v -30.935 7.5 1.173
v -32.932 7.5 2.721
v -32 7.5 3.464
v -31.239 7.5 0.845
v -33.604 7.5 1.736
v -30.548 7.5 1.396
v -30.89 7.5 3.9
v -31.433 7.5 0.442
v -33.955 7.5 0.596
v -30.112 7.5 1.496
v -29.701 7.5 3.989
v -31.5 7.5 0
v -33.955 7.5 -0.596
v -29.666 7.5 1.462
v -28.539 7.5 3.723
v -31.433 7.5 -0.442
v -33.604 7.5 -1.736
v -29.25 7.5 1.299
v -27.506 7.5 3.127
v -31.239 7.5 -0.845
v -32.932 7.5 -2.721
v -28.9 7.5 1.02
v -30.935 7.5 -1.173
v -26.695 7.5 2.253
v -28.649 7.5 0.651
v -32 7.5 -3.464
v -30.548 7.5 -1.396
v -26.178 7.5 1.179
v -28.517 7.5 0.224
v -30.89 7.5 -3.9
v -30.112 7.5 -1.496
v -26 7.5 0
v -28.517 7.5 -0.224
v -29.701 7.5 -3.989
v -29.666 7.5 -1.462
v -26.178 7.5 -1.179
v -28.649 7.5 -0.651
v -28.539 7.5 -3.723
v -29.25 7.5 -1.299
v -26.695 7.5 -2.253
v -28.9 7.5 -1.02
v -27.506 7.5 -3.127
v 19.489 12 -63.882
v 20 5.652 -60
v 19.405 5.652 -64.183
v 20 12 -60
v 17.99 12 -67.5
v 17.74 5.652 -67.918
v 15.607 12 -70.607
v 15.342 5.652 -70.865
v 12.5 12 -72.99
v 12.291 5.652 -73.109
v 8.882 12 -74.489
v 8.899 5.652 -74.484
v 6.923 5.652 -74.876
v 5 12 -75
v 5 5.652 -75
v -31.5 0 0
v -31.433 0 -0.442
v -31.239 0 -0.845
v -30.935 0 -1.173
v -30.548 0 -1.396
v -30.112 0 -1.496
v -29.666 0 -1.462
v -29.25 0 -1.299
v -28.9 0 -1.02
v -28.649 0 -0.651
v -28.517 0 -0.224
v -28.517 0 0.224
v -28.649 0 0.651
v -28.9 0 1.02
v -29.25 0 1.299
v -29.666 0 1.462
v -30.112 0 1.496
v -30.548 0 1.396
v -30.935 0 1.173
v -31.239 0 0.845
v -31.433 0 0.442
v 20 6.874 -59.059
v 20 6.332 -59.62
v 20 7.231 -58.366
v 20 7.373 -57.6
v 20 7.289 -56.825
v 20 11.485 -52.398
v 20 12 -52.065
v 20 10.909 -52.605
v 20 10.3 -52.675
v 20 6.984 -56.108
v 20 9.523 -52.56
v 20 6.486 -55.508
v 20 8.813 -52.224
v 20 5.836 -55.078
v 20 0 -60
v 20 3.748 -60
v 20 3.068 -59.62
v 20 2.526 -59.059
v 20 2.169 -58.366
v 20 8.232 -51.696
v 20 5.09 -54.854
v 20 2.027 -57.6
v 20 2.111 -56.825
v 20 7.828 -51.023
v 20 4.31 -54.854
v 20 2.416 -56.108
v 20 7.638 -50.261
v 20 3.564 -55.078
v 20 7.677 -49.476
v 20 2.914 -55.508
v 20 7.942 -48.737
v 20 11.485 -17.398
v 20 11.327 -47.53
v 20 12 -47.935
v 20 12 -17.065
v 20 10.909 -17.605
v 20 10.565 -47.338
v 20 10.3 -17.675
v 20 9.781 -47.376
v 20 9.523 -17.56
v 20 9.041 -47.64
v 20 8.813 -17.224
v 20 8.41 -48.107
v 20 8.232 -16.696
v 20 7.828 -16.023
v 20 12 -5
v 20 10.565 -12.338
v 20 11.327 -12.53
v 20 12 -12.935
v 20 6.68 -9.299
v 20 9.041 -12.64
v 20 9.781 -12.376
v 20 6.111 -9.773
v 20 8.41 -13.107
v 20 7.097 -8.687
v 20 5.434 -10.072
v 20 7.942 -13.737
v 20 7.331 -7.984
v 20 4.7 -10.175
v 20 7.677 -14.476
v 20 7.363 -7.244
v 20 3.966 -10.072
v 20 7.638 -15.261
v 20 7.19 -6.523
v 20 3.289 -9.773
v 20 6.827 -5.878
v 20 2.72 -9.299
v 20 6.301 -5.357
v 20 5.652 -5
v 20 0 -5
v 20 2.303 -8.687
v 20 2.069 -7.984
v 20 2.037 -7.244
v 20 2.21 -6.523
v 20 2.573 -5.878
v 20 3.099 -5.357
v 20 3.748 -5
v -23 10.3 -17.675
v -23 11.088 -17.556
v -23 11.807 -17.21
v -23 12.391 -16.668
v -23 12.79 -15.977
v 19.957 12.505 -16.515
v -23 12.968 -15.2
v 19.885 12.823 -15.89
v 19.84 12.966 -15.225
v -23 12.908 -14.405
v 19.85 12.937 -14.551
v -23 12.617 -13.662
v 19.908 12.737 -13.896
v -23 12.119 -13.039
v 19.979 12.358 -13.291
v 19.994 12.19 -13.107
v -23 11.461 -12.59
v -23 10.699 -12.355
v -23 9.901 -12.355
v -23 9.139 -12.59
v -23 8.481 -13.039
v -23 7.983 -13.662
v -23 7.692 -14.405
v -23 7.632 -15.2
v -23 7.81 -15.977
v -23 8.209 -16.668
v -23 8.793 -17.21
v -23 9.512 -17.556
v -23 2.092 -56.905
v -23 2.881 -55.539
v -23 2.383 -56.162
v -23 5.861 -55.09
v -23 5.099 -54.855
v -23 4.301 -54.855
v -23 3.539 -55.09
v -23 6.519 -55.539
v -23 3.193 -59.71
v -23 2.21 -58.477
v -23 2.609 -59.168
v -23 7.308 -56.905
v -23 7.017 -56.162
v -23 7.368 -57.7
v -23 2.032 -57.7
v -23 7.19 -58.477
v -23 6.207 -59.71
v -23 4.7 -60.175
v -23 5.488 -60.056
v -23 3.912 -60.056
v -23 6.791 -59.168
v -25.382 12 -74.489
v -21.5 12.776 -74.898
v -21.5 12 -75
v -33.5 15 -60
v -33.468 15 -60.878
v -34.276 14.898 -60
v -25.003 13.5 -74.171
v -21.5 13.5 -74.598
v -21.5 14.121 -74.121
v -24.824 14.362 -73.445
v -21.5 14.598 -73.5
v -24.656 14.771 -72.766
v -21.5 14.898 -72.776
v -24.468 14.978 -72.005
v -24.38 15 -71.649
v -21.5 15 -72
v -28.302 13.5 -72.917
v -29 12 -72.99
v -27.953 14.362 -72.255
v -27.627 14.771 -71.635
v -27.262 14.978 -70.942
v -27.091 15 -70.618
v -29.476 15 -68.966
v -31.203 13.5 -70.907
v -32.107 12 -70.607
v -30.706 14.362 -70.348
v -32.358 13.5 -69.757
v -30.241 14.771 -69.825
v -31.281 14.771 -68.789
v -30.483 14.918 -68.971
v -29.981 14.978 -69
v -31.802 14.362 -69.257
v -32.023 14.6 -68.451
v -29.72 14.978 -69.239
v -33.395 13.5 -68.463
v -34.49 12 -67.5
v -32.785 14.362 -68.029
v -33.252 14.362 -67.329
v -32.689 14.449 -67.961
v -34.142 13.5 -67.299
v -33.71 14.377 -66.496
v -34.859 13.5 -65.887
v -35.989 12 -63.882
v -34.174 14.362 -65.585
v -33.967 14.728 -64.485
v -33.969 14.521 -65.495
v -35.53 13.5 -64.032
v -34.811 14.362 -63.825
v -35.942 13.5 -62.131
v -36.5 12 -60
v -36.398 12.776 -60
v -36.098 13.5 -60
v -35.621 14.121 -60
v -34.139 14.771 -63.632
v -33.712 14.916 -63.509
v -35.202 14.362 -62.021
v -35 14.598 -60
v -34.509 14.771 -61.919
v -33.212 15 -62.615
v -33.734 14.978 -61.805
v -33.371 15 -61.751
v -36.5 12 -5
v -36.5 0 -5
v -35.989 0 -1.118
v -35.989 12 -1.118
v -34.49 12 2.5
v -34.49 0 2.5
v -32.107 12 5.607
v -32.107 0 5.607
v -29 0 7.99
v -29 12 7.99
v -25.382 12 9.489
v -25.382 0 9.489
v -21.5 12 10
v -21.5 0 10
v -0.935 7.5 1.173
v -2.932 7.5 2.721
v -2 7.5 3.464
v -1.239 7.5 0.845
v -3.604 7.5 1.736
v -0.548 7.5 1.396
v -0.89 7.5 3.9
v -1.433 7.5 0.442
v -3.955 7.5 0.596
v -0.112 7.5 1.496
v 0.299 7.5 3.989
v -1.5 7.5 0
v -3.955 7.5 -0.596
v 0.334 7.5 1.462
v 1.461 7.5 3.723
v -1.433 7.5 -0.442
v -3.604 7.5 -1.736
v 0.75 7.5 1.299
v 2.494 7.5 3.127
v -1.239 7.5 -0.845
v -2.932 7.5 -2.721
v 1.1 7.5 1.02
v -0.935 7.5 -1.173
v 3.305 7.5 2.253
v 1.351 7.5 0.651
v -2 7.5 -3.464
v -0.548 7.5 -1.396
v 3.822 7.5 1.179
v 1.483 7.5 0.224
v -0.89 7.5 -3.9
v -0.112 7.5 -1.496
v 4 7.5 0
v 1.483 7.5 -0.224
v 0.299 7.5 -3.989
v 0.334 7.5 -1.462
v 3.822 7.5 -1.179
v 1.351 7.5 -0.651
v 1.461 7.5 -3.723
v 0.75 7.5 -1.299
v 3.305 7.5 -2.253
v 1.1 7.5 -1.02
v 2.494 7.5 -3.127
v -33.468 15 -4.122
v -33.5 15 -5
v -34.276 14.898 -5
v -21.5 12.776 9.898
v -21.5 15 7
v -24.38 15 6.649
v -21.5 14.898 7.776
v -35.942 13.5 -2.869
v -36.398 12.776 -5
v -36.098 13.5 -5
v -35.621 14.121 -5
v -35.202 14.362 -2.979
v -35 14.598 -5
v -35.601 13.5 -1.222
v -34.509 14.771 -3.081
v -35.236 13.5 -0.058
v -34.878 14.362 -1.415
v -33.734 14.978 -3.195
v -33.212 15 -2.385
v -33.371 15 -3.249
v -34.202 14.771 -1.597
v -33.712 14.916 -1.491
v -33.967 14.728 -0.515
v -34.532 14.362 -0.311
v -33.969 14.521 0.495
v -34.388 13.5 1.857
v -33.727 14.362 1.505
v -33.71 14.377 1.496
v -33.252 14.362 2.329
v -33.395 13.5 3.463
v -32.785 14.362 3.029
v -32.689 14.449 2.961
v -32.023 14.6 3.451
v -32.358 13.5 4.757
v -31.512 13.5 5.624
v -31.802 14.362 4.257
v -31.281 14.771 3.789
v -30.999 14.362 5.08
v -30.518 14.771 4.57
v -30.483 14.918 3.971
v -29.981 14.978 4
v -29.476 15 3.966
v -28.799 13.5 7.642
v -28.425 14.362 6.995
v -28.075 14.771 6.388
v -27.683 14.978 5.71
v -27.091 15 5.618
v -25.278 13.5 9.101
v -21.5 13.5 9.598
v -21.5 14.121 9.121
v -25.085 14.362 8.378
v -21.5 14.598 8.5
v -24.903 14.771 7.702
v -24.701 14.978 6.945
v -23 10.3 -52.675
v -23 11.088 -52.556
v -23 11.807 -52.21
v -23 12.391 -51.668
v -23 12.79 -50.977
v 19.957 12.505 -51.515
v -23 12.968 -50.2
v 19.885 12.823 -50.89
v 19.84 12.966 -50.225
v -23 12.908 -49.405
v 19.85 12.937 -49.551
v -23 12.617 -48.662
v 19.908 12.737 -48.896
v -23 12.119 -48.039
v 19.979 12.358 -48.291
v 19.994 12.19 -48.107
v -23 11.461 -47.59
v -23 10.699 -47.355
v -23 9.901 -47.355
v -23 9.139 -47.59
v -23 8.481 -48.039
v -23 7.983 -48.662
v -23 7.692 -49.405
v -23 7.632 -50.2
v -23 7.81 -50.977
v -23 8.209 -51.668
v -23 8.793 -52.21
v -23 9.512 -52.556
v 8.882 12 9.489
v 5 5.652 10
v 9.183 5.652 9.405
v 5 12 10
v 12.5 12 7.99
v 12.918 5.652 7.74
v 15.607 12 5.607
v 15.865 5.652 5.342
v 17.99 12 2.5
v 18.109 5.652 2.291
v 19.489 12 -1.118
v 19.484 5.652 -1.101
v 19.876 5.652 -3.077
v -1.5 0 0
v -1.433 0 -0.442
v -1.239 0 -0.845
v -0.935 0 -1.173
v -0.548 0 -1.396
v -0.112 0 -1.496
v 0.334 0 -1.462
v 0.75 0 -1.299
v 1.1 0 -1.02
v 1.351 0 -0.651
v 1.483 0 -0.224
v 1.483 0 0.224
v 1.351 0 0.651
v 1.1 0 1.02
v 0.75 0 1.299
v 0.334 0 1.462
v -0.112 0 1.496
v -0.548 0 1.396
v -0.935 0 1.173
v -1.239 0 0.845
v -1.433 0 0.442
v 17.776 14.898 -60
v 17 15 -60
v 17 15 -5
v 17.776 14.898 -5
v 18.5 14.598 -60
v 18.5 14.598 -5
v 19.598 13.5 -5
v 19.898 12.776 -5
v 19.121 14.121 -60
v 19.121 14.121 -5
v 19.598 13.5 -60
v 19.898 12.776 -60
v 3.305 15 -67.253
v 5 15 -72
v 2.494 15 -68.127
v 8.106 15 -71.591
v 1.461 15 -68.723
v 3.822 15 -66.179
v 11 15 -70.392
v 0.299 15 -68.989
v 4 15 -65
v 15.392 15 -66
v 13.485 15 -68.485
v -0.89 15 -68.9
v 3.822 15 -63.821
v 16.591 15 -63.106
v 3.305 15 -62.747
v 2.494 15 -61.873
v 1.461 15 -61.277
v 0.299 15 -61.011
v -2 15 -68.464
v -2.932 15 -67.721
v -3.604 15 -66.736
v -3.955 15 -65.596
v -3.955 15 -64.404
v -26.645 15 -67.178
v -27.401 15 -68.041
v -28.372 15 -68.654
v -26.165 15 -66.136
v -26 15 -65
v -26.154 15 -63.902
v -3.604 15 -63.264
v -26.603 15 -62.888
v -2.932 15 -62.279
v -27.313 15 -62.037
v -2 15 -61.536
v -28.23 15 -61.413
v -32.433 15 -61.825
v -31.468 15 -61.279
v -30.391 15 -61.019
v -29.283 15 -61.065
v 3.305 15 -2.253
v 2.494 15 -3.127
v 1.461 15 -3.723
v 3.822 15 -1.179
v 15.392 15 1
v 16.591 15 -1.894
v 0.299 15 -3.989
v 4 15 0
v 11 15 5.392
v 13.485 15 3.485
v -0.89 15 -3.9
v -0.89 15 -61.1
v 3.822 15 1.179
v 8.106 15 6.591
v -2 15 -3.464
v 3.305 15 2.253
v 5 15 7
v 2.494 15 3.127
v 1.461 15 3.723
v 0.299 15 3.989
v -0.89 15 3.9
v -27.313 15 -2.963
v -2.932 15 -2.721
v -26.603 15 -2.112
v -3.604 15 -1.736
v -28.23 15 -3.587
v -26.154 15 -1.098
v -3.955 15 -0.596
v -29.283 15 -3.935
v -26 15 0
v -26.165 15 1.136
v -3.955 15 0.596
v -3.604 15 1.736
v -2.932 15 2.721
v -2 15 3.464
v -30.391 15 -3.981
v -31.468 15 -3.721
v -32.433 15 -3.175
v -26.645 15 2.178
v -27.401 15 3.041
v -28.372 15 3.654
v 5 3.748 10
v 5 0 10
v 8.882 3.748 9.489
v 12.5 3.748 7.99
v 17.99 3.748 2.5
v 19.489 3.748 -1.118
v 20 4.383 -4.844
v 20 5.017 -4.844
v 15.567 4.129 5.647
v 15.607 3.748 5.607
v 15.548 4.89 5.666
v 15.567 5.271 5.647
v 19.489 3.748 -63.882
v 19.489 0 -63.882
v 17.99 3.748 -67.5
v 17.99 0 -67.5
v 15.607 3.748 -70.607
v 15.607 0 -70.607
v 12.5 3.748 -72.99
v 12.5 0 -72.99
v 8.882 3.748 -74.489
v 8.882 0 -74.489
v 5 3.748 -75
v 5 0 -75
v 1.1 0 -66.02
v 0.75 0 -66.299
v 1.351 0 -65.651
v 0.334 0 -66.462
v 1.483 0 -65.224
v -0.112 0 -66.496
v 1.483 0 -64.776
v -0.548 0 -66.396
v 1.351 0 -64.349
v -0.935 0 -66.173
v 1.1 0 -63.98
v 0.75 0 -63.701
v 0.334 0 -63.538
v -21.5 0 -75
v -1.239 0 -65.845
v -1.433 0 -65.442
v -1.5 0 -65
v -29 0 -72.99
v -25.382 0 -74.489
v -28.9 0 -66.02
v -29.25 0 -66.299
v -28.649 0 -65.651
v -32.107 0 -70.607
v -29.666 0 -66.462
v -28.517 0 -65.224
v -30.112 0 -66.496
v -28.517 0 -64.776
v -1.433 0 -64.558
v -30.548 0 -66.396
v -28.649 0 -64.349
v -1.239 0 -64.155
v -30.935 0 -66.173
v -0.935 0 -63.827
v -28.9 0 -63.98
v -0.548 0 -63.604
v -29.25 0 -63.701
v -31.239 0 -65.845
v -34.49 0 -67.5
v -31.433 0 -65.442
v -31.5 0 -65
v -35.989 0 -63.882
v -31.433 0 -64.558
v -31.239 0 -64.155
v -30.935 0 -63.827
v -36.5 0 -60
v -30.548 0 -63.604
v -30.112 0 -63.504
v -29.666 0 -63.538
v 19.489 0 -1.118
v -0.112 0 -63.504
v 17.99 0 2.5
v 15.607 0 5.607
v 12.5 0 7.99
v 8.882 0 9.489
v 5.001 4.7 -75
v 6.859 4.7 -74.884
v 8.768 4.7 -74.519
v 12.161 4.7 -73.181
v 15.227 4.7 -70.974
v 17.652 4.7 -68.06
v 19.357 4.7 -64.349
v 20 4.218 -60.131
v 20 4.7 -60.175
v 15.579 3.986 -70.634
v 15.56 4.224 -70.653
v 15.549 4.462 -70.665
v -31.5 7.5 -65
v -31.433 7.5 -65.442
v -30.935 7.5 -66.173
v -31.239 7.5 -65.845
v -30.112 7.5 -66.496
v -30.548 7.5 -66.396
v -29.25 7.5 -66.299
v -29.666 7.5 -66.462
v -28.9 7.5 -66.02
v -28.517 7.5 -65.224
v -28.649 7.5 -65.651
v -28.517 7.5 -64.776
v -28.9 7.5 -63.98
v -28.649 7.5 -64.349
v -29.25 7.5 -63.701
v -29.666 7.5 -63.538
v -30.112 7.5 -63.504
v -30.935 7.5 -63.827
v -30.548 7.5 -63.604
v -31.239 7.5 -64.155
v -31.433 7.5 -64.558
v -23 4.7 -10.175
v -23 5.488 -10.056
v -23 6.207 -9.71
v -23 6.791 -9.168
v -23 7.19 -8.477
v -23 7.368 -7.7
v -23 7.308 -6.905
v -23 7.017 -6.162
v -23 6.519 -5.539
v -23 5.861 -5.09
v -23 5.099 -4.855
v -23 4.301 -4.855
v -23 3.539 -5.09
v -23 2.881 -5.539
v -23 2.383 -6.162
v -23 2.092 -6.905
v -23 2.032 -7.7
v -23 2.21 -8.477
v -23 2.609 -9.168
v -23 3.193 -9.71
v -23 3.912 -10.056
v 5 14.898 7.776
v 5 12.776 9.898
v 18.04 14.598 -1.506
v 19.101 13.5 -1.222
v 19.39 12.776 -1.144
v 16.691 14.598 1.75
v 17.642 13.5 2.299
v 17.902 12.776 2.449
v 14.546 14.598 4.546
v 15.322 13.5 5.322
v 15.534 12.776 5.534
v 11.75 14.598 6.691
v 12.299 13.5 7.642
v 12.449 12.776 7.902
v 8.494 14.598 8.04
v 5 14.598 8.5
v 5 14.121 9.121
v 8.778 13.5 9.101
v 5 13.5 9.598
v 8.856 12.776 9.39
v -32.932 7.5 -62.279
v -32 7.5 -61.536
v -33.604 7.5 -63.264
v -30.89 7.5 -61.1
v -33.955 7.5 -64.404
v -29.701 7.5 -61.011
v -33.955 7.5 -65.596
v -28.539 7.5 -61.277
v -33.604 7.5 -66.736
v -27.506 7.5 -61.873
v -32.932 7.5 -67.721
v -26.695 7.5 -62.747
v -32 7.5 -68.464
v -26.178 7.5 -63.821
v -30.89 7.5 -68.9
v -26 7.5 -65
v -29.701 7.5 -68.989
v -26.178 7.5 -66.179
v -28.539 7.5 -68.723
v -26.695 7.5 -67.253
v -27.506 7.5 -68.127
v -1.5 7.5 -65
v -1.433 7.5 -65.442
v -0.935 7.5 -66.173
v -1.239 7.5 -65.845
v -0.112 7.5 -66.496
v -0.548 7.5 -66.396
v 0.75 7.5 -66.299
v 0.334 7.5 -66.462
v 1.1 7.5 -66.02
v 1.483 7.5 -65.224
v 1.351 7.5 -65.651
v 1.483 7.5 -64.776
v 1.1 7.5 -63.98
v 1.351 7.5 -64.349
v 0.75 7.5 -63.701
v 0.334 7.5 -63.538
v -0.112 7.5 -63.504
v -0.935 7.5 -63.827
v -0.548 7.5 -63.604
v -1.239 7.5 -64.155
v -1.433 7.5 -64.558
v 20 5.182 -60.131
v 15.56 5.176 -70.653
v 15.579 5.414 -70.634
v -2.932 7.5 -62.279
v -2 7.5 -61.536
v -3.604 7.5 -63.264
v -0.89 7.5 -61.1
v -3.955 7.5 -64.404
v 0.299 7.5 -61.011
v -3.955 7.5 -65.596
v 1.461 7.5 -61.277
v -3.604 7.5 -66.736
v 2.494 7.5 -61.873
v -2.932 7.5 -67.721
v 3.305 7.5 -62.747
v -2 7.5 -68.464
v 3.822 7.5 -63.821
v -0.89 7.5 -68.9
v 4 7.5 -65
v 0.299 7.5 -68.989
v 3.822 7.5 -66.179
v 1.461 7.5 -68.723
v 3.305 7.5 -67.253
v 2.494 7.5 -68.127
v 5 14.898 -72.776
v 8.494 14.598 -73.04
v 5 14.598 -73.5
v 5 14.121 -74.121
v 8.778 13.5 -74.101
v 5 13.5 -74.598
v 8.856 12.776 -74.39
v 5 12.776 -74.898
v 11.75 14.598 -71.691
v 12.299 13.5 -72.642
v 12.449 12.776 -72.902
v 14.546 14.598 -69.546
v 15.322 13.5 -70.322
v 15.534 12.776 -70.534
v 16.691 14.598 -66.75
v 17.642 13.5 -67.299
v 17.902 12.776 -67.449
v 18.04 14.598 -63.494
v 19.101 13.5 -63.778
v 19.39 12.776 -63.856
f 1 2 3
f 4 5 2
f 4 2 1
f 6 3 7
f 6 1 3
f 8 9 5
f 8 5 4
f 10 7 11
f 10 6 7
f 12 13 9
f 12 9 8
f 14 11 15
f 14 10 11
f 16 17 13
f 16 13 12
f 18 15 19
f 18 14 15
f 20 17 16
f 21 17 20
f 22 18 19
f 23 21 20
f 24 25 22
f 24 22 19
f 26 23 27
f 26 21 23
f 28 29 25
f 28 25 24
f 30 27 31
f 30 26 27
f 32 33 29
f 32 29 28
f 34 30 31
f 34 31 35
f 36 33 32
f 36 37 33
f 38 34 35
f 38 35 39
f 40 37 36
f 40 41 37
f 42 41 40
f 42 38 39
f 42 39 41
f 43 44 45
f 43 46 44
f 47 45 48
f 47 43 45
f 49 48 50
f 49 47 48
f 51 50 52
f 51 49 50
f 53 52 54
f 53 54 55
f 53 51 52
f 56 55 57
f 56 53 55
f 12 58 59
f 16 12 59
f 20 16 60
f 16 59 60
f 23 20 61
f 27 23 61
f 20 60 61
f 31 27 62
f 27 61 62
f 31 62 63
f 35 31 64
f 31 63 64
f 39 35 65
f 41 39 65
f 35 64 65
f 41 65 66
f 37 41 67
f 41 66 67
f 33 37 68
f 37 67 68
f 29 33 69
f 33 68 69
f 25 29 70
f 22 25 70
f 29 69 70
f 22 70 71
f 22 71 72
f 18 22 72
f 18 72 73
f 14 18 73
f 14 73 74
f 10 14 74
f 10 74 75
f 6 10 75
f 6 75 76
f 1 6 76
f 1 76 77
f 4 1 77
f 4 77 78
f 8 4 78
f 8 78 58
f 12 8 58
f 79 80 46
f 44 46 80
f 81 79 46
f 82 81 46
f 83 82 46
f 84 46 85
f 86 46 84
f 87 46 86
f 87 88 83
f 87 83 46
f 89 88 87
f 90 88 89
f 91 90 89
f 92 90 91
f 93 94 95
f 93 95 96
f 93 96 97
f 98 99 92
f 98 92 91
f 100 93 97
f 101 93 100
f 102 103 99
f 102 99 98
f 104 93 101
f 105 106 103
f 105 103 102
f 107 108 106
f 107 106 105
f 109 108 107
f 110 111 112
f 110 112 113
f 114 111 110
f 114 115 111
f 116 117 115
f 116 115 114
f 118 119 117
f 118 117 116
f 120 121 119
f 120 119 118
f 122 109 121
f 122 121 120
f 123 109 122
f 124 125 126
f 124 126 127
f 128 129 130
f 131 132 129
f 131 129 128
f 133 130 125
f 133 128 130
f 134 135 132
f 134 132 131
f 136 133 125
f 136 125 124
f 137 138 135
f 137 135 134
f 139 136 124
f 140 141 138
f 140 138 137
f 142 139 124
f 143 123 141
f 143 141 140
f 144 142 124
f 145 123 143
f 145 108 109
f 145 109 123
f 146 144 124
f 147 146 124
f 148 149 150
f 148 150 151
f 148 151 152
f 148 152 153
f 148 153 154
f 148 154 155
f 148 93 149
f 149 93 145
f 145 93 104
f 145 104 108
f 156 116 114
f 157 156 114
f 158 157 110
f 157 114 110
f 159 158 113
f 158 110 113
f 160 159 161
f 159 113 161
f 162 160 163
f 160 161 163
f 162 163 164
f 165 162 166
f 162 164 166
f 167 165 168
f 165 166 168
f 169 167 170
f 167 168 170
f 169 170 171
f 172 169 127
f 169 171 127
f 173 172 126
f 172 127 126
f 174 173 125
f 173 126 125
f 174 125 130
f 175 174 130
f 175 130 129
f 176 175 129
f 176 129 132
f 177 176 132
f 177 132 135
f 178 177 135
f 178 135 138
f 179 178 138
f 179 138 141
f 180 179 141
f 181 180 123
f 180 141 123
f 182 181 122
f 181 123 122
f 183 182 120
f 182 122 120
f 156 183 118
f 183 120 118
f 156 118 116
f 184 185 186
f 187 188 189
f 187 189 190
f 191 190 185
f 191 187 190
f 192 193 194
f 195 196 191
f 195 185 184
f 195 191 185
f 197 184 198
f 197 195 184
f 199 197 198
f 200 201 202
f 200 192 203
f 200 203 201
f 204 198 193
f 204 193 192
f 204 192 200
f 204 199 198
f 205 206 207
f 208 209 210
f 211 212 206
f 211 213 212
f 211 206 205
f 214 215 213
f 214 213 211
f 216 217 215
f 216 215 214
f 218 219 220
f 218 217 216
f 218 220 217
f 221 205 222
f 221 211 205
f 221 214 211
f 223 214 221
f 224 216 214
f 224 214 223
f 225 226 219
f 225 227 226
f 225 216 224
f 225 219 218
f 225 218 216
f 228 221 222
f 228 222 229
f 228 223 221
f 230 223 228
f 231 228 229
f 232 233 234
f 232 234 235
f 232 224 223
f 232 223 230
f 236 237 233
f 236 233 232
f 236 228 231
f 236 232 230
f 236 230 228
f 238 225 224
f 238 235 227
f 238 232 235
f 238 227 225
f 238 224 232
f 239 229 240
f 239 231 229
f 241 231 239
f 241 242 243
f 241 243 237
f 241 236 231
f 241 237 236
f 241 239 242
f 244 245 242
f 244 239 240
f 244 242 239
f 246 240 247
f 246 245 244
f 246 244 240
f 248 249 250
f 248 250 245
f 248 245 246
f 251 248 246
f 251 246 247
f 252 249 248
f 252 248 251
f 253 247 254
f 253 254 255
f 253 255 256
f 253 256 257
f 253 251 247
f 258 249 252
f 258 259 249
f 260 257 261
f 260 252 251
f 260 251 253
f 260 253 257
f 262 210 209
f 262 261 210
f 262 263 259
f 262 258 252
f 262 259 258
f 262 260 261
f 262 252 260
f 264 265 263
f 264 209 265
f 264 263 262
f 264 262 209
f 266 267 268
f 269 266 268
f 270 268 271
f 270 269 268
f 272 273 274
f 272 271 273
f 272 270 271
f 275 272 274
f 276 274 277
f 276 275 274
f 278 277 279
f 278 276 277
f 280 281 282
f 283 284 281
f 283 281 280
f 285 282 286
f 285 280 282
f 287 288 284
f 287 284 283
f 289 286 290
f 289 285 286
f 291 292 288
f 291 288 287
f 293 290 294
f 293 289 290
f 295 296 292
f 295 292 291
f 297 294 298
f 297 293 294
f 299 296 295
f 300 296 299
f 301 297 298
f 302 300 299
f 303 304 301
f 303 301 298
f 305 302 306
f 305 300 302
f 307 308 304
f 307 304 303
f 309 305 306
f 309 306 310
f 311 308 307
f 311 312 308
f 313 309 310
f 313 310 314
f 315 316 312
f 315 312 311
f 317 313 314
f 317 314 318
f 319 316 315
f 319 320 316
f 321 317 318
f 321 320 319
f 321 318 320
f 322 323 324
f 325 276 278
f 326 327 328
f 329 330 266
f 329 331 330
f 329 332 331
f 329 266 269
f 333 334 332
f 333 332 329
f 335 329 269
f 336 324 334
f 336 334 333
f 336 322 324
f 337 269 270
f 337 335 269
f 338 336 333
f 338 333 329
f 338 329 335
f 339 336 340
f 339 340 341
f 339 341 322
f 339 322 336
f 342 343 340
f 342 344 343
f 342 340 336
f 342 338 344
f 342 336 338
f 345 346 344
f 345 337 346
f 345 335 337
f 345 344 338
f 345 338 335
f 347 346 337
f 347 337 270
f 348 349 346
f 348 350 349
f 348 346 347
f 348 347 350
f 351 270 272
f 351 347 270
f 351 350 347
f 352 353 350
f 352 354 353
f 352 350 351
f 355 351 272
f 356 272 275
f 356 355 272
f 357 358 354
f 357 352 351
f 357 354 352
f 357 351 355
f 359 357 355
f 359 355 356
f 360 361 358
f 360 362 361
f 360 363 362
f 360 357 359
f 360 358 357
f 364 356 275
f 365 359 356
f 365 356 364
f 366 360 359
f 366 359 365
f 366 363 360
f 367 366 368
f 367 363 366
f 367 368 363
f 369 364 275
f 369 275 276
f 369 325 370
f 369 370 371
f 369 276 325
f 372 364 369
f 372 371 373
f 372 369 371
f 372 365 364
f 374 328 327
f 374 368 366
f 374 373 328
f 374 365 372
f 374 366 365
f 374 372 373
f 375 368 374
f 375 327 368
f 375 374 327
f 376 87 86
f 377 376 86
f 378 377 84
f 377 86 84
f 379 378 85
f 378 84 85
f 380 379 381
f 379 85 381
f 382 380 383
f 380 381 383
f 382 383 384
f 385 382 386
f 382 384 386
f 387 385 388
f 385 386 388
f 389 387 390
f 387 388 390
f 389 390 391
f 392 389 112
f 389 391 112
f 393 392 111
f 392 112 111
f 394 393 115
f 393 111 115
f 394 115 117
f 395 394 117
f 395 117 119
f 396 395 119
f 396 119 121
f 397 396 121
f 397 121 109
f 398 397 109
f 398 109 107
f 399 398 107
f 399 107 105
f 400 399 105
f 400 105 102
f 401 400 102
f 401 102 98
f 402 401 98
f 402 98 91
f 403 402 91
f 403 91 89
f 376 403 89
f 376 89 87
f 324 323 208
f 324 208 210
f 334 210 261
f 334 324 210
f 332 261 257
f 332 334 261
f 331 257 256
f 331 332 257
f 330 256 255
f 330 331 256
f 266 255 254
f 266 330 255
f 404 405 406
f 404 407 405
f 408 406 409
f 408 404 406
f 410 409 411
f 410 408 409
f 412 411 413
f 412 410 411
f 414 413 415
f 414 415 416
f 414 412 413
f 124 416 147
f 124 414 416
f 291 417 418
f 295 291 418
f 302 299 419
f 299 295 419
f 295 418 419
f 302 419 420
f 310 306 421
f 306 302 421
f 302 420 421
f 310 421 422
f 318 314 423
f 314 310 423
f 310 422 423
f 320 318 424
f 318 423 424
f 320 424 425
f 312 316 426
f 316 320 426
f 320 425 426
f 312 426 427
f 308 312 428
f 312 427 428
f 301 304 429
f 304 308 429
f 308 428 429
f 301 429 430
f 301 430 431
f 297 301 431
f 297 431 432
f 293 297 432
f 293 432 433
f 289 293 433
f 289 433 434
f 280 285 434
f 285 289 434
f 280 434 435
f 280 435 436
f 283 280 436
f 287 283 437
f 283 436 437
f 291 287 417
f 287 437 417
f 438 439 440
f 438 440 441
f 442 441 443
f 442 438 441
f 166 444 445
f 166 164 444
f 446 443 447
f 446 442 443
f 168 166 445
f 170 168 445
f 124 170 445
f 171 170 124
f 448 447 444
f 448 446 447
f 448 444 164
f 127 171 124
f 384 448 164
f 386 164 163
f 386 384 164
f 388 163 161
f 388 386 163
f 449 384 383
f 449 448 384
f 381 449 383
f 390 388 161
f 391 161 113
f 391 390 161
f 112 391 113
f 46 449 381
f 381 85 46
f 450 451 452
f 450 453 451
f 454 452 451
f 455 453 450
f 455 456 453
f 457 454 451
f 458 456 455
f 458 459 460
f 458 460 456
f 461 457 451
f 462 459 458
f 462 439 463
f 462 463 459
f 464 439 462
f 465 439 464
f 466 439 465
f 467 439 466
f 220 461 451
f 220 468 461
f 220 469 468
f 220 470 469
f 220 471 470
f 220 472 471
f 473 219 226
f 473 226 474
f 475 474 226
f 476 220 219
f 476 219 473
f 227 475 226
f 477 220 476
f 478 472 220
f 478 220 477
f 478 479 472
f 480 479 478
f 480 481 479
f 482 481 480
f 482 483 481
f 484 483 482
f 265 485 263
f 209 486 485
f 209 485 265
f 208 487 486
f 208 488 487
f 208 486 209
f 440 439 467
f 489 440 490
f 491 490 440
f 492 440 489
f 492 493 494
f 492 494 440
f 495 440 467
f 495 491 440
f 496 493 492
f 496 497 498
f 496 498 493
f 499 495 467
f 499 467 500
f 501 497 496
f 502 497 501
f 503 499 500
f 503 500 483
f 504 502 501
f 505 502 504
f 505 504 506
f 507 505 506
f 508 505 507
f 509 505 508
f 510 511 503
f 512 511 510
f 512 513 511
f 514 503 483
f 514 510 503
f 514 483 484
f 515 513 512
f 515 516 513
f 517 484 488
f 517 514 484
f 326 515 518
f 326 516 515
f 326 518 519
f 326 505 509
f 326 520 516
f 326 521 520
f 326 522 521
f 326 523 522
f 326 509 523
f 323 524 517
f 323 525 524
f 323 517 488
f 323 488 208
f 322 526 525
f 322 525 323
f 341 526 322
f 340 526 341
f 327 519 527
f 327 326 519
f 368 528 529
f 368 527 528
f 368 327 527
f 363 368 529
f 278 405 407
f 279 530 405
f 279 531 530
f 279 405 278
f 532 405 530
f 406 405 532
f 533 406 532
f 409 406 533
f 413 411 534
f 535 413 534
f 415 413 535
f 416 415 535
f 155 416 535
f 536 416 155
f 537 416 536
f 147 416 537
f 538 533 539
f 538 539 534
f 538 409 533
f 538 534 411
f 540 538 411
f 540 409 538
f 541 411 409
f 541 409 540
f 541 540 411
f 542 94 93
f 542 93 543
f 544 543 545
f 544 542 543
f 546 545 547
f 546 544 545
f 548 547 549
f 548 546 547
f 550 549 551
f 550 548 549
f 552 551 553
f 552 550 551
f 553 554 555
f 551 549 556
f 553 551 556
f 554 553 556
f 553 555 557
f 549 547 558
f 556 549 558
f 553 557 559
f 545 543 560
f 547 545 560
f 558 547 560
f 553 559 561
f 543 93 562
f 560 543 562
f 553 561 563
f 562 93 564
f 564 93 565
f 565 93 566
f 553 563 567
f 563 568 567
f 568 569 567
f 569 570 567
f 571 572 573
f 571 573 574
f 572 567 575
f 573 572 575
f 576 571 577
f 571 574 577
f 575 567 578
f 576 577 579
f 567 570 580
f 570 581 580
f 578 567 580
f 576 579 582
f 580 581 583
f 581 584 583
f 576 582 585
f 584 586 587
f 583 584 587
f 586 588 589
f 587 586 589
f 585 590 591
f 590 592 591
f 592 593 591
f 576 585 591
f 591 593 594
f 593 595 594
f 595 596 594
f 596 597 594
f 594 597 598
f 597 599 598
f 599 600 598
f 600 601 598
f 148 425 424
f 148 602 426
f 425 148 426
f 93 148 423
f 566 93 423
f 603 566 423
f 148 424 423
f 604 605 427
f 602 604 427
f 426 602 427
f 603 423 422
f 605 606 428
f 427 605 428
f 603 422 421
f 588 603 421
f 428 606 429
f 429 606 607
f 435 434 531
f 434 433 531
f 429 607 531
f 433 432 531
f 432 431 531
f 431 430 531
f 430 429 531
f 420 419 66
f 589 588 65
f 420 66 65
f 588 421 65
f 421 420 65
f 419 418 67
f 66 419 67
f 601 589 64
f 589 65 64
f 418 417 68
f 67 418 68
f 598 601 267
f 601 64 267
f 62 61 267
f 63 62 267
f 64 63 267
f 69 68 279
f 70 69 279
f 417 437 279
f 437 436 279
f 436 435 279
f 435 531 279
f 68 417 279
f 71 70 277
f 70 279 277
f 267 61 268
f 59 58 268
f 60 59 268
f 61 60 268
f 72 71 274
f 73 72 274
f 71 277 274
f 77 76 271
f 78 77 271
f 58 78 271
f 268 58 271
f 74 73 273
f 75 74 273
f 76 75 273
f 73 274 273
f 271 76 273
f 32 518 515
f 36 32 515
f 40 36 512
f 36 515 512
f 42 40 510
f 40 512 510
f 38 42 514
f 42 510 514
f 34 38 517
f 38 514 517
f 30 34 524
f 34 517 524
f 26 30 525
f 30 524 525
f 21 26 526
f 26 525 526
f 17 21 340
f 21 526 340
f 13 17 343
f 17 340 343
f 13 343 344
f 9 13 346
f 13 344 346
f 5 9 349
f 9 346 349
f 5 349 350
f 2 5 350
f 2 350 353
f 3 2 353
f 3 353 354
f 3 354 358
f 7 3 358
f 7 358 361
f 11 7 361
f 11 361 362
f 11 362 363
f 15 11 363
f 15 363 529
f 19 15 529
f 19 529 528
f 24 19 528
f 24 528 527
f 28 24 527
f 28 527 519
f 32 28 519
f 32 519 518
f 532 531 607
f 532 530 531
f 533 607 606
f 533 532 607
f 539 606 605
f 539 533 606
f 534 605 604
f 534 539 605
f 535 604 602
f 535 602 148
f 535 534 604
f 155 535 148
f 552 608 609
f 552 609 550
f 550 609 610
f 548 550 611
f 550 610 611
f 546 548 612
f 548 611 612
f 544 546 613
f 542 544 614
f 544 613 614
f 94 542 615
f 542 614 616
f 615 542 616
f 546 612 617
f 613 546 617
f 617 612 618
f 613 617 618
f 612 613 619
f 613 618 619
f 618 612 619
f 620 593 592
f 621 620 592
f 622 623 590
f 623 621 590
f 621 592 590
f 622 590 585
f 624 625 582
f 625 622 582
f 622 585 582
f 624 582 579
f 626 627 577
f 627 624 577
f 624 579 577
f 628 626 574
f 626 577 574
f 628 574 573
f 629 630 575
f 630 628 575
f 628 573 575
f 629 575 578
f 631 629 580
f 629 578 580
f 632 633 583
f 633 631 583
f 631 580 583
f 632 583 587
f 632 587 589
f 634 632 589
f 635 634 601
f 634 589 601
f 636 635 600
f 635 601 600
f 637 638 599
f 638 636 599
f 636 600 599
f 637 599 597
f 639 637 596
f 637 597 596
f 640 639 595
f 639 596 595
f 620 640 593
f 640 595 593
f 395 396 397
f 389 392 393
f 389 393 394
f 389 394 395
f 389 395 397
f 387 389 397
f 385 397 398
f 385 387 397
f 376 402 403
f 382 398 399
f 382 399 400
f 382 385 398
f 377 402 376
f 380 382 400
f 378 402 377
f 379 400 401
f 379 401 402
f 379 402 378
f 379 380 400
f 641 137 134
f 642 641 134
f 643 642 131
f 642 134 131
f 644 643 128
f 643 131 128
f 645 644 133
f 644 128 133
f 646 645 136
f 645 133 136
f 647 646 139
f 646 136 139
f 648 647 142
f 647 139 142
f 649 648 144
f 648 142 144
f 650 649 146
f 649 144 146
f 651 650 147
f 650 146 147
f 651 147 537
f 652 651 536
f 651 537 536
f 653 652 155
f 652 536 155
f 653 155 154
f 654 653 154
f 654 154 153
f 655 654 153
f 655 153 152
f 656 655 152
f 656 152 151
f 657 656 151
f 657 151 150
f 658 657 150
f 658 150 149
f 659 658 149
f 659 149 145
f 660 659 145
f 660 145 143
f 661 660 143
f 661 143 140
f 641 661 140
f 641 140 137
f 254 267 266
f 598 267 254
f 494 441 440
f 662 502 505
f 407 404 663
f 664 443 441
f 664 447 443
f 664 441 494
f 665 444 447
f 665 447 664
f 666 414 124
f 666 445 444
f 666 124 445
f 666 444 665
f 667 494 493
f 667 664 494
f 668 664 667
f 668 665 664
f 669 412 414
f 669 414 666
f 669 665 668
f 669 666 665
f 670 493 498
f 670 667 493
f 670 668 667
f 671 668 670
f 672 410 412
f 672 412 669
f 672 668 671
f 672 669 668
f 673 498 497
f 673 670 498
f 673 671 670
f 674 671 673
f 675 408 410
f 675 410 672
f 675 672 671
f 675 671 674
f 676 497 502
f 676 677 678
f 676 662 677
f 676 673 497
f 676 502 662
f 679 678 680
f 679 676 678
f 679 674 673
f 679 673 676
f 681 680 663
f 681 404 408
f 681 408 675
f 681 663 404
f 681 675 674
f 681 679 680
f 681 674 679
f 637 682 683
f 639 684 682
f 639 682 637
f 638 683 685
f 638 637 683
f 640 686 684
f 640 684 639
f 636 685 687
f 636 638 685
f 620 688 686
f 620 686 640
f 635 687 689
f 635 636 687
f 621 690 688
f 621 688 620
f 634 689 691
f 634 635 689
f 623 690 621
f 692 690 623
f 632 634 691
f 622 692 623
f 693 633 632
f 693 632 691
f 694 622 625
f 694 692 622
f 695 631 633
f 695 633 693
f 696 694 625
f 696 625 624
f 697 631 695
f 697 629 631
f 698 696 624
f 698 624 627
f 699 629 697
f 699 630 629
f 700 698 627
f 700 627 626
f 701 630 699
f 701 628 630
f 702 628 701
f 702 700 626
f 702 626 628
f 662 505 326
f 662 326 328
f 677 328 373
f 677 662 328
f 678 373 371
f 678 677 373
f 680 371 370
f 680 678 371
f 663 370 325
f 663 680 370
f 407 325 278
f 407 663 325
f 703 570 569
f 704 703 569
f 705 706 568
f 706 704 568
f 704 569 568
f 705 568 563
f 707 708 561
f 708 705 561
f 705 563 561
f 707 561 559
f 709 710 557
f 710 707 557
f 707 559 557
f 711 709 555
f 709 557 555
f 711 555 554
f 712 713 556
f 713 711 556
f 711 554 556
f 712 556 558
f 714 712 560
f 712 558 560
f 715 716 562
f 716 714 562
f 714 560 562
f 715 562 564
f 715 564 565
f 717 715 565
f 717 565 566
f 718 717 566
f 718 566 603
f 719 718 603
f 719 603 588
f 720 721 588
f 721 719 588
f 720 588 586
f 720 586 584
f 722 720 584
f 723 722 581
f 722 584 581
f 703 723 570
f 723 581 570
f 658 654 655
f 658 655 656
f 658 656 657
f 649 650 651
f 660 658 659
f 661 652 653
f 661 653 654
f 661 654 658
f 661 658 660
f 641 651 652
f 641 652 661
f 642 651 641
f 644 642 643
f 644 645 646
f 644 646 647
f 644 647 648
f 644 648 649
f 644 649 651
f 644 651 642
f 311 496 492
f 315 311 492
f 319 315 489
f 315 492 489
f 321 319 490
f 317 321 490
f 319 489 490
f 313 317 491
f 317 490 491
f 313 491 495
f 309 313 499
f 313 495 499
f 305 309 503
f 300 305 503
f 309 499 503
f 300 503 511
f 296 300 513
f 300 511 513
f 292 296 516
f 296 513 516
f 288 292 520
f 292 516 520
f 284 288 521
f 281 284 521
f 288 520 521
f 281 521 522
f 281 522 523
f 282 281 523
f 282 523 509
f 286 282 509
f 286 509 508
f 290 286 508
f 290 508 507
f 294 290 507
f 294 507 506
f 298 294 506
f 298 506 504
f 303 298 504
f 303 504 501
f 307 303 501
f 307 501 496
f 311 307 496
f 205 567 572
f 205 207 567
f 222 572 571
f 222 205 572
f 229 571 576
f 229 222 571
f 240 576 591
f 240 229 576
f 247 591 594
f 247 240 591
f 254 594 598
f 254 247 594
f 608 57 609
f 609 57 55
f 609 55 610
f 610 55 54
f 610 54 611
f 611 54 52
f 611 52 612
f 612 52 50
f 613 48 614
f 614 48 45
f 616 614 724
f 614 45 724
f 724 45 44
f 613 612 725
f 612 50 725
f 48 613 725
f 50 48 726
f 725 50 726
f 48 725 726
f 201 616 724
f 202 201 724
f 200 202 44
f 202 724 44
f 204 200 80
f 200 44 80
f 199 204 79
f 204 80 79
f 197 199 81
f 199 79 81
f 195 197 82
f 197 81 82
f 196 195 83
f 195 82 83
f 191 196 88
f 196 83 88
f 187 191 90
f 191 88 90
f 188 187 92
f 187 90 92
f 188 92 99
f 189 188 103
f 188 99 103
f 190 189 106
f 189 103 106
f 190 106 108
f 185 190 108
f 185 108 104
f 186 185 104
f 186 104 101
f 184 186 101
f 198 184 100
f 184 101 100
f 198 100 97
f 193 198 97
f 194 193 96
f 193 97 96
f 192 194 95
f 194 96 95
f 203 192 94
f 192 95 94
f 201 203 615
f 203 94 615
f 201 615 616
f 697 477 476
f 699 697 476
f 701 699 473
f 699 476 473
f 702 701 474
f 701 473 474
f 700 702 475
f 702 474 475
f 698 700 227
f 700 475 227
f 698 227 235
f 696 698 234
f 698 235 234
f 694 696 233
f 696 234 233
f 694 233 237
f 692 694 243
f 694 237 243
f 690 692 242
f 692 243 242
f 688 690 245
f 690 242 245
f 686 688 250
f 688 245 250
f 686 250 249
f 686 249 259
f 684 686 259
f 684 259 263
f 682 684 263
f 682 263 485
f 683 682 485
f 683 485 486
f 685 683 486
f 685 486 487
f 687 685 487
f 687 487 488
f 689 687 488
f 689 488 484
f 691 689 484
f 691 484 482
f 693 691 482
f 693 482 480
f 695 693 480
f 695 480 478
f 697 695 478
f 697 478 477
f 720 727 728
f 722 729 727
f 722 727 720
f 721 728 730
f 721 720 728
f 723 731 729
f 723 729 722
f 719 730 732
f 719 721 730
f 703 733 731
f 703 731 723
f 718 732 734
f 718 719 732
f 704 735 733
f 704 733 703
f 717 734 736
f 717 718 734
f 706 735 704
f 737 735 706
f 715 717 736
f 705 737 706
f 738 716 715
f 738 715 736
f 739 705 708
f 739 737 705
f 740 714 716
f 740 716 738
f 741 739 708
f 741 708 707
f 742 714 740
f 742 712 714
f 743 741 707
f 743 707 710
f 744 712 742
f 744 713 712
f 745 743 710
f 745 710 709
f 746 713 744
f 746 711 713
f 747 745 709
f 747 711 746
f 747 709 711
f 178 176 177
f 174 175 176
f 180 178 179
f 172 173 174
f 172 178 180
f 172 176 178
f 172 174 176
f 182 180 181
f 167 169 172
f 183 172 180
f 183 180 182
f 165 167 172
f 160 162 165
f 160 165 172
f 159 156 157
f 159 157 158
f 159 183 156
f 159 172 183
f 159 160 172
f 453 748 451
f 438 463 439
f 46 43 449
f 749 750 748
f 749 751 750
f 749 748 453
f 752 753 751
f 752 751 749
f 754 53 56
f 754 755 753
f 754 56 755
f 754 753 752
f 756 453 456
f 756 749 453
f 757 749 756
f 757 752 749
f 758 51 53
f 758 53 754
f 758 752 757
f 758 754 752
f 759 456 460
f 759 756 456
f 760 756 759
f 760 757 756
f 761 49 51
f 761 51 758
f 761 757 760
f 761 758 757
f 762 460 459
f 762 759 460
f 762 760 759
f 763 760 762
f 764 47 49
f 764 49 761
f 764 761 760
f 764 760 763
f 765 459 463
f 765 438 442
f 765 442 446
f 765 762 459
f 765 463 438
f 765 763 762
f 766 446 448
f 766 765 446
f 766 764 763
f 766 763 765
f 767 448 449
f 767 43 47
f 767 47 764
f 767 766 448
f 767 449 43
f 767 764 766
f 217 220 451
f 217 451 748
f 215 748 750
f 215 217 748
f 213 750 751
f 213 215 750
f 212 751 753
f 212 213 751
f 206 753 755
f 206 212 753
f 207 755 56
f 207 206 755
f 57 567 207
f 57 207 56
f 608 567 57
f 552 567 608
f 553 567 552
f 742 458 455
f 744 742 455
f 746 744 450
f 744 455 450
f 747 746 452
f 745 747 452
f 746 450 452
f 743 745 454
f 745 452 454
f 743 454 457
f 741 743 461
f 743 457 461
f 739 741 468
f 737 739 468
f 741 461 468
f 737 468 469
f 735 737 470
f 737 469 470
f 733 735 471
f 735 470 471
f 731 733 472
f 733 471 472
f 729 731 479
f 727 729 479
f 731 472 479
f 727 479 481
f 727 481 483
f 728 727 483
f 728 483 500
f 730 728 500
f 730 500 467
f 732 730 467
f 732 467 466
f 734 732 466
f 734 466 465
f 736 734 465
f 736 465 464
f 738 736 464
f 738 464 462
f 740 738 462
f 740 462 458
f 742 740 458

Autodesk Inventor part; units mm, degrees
ref_plane "YZ Plane" through (0, 0, 0) normal (1, 0, 0) x (0, 1, 0)
ref_plane "XZ Plane" through (0, 0, 0) normal (0, 1, 0) x (-1, 0, 0)
ref_plane "XY Plane" through (0, 0, 0) normal (0, 0, 1) x (1, 0, 0)
sketch "Sketch1" plane through (0, 0, 0) normal (0, 1, 0) x (-1, 0, 0)
  line L0 (0, 0) -> (30, 0)
  line L1 (30, 0) -> (30, -65)
  line L2 (30, -65) -> (0, -65)
  line L3 (0, -65) -> (0, 0)
  line L4 (-20, 10) -> (36.5, 10)
  line L5 (36.5, 10) -> (36.5, -75)
  line L6 (36.5, -75) -> (-20, -75)
  line L7 (-20, -75) -> (-20, 10)
  circle A0 centre (30, 0) radius 1.5
  circle A1 centre (30, -65) radius 1.5
  circle A2 centre (0, 0) radius 1.5
  circle A3 centre (0, -65) radius 1.5
  dimension "d0" = 30
  dimension "d1" = 65
  dimension "d2" = 10
  dimension "d3" = 6.5
  dimension "d4" = 10
  dimension "d5" = 20
  dimension "d6" = 3
  dimension "d7" = 3
  dimension "d8" = 3
  dimension "d9" = 3
extrude "Extrusion1" add sketch "Sketch1" along normal blind 15 contours L0 A0 L1 A1 L2 A3 L3 A2 | L4 L5 L6 L7
sketch "Sketch2" plane through (20, 0, 10) normal (1, 0, 0) x (0, 0, -1)
  line L0 (0, 0) -> (0, 15) projected
  line L1 (85, 0) -> (85, 15) projected
  line L2 (42.5, 4.7) -> (42.5, 11.9085)
  circle A0 centre (17.5, 4.7) radius 2.675
  circle A1 centre (67.5, 4.7) radius 2.675
  line L3 (0, 4.7) -> (85, 4.7)
  line L4 (0, 0) -> (85, 0) projected
  line L5 (0, 10.3) -> (85, 10.3)
  circle A2 centre (25, 10.3) radius 2.675
  circle A3 centre (60, 10.3) radius 2.675
  line L6 (0, 15) -> (85, 15) projected
  line L7 (17.5, 7.375) -> (26.8128, 7.375)
  point P0 (10, 0)
  dimension "d12" = 5.35
  dimension "d13" = 5.35
  dimension "d26" = 4.7
  dimension "d27" = 5.35
  dimension "d28" = 5.35
  dimension "d29" = 4.7
  dimension "d31" = 17.5
  dimension "d32" = 17.5
  dimension "d33" = 25
  dimension "d34" = 25
extrude "Extrusion2" cut sketch "Sketch2" against normal blind 43 contours L3 A0 | A0 L3 | A2 L5 | L5 A2 | L3 A1 | A1 L3 | A3 L5 | L5 A3
sketch "Sketch3" plane through (0, 15, 0) normal (0, 1, 0) x (1, 0, 0)
  circle A0 centre (-30, 0) radius 1.5 projected
  circle A1 centre (-30, 0) radius 4
  circle A2 centre (-30, 65) radius 1.5 projected
  circle A3 centre (-30, 65) radius 4
  circle A4 centre (0, 0) radius 1.5 projected
  circle A5 centre (0, 0) radius 4
  circle A6 centre (0, 65) radius 1.5 projected
  circle A7 centre (0, 65) radius 4
  dimension "d18" = 8
  dimension "d19" = 8
  dimension "d20" = 8
  dimension "d21" = 8
extrude "Extrusion3" cut sketch "Sketch3" against normal blind 7.5 contours A0 | A1 | A3 | A5 | A7
fillet "Fillet1" radius 15 4 edges at (-36.5, 7.5, 10) (20, 7.5, 10) (20, 7.5, -75) (-36.5, 7.5, -75)
sketch "Sketch4" plane through (-36.5, 0, -60) normal (-1, 0, 0) x (0, 0, 1)
  point P0 (60, 0)
fillet "Fillet3" radius 3 8 edges at (15.6066, 15, -70.6066) (-8.25, 15, -75) (-32.1066, 15, -70.6066) (-36.5, 15, -32.5) (-32.1066, 15, 5.6066) (-8.25, 15, 10) (15.6066, 15, 5.6066) (20, 15, -32.5)
properties part number "BaseStabilizerAttachment"
